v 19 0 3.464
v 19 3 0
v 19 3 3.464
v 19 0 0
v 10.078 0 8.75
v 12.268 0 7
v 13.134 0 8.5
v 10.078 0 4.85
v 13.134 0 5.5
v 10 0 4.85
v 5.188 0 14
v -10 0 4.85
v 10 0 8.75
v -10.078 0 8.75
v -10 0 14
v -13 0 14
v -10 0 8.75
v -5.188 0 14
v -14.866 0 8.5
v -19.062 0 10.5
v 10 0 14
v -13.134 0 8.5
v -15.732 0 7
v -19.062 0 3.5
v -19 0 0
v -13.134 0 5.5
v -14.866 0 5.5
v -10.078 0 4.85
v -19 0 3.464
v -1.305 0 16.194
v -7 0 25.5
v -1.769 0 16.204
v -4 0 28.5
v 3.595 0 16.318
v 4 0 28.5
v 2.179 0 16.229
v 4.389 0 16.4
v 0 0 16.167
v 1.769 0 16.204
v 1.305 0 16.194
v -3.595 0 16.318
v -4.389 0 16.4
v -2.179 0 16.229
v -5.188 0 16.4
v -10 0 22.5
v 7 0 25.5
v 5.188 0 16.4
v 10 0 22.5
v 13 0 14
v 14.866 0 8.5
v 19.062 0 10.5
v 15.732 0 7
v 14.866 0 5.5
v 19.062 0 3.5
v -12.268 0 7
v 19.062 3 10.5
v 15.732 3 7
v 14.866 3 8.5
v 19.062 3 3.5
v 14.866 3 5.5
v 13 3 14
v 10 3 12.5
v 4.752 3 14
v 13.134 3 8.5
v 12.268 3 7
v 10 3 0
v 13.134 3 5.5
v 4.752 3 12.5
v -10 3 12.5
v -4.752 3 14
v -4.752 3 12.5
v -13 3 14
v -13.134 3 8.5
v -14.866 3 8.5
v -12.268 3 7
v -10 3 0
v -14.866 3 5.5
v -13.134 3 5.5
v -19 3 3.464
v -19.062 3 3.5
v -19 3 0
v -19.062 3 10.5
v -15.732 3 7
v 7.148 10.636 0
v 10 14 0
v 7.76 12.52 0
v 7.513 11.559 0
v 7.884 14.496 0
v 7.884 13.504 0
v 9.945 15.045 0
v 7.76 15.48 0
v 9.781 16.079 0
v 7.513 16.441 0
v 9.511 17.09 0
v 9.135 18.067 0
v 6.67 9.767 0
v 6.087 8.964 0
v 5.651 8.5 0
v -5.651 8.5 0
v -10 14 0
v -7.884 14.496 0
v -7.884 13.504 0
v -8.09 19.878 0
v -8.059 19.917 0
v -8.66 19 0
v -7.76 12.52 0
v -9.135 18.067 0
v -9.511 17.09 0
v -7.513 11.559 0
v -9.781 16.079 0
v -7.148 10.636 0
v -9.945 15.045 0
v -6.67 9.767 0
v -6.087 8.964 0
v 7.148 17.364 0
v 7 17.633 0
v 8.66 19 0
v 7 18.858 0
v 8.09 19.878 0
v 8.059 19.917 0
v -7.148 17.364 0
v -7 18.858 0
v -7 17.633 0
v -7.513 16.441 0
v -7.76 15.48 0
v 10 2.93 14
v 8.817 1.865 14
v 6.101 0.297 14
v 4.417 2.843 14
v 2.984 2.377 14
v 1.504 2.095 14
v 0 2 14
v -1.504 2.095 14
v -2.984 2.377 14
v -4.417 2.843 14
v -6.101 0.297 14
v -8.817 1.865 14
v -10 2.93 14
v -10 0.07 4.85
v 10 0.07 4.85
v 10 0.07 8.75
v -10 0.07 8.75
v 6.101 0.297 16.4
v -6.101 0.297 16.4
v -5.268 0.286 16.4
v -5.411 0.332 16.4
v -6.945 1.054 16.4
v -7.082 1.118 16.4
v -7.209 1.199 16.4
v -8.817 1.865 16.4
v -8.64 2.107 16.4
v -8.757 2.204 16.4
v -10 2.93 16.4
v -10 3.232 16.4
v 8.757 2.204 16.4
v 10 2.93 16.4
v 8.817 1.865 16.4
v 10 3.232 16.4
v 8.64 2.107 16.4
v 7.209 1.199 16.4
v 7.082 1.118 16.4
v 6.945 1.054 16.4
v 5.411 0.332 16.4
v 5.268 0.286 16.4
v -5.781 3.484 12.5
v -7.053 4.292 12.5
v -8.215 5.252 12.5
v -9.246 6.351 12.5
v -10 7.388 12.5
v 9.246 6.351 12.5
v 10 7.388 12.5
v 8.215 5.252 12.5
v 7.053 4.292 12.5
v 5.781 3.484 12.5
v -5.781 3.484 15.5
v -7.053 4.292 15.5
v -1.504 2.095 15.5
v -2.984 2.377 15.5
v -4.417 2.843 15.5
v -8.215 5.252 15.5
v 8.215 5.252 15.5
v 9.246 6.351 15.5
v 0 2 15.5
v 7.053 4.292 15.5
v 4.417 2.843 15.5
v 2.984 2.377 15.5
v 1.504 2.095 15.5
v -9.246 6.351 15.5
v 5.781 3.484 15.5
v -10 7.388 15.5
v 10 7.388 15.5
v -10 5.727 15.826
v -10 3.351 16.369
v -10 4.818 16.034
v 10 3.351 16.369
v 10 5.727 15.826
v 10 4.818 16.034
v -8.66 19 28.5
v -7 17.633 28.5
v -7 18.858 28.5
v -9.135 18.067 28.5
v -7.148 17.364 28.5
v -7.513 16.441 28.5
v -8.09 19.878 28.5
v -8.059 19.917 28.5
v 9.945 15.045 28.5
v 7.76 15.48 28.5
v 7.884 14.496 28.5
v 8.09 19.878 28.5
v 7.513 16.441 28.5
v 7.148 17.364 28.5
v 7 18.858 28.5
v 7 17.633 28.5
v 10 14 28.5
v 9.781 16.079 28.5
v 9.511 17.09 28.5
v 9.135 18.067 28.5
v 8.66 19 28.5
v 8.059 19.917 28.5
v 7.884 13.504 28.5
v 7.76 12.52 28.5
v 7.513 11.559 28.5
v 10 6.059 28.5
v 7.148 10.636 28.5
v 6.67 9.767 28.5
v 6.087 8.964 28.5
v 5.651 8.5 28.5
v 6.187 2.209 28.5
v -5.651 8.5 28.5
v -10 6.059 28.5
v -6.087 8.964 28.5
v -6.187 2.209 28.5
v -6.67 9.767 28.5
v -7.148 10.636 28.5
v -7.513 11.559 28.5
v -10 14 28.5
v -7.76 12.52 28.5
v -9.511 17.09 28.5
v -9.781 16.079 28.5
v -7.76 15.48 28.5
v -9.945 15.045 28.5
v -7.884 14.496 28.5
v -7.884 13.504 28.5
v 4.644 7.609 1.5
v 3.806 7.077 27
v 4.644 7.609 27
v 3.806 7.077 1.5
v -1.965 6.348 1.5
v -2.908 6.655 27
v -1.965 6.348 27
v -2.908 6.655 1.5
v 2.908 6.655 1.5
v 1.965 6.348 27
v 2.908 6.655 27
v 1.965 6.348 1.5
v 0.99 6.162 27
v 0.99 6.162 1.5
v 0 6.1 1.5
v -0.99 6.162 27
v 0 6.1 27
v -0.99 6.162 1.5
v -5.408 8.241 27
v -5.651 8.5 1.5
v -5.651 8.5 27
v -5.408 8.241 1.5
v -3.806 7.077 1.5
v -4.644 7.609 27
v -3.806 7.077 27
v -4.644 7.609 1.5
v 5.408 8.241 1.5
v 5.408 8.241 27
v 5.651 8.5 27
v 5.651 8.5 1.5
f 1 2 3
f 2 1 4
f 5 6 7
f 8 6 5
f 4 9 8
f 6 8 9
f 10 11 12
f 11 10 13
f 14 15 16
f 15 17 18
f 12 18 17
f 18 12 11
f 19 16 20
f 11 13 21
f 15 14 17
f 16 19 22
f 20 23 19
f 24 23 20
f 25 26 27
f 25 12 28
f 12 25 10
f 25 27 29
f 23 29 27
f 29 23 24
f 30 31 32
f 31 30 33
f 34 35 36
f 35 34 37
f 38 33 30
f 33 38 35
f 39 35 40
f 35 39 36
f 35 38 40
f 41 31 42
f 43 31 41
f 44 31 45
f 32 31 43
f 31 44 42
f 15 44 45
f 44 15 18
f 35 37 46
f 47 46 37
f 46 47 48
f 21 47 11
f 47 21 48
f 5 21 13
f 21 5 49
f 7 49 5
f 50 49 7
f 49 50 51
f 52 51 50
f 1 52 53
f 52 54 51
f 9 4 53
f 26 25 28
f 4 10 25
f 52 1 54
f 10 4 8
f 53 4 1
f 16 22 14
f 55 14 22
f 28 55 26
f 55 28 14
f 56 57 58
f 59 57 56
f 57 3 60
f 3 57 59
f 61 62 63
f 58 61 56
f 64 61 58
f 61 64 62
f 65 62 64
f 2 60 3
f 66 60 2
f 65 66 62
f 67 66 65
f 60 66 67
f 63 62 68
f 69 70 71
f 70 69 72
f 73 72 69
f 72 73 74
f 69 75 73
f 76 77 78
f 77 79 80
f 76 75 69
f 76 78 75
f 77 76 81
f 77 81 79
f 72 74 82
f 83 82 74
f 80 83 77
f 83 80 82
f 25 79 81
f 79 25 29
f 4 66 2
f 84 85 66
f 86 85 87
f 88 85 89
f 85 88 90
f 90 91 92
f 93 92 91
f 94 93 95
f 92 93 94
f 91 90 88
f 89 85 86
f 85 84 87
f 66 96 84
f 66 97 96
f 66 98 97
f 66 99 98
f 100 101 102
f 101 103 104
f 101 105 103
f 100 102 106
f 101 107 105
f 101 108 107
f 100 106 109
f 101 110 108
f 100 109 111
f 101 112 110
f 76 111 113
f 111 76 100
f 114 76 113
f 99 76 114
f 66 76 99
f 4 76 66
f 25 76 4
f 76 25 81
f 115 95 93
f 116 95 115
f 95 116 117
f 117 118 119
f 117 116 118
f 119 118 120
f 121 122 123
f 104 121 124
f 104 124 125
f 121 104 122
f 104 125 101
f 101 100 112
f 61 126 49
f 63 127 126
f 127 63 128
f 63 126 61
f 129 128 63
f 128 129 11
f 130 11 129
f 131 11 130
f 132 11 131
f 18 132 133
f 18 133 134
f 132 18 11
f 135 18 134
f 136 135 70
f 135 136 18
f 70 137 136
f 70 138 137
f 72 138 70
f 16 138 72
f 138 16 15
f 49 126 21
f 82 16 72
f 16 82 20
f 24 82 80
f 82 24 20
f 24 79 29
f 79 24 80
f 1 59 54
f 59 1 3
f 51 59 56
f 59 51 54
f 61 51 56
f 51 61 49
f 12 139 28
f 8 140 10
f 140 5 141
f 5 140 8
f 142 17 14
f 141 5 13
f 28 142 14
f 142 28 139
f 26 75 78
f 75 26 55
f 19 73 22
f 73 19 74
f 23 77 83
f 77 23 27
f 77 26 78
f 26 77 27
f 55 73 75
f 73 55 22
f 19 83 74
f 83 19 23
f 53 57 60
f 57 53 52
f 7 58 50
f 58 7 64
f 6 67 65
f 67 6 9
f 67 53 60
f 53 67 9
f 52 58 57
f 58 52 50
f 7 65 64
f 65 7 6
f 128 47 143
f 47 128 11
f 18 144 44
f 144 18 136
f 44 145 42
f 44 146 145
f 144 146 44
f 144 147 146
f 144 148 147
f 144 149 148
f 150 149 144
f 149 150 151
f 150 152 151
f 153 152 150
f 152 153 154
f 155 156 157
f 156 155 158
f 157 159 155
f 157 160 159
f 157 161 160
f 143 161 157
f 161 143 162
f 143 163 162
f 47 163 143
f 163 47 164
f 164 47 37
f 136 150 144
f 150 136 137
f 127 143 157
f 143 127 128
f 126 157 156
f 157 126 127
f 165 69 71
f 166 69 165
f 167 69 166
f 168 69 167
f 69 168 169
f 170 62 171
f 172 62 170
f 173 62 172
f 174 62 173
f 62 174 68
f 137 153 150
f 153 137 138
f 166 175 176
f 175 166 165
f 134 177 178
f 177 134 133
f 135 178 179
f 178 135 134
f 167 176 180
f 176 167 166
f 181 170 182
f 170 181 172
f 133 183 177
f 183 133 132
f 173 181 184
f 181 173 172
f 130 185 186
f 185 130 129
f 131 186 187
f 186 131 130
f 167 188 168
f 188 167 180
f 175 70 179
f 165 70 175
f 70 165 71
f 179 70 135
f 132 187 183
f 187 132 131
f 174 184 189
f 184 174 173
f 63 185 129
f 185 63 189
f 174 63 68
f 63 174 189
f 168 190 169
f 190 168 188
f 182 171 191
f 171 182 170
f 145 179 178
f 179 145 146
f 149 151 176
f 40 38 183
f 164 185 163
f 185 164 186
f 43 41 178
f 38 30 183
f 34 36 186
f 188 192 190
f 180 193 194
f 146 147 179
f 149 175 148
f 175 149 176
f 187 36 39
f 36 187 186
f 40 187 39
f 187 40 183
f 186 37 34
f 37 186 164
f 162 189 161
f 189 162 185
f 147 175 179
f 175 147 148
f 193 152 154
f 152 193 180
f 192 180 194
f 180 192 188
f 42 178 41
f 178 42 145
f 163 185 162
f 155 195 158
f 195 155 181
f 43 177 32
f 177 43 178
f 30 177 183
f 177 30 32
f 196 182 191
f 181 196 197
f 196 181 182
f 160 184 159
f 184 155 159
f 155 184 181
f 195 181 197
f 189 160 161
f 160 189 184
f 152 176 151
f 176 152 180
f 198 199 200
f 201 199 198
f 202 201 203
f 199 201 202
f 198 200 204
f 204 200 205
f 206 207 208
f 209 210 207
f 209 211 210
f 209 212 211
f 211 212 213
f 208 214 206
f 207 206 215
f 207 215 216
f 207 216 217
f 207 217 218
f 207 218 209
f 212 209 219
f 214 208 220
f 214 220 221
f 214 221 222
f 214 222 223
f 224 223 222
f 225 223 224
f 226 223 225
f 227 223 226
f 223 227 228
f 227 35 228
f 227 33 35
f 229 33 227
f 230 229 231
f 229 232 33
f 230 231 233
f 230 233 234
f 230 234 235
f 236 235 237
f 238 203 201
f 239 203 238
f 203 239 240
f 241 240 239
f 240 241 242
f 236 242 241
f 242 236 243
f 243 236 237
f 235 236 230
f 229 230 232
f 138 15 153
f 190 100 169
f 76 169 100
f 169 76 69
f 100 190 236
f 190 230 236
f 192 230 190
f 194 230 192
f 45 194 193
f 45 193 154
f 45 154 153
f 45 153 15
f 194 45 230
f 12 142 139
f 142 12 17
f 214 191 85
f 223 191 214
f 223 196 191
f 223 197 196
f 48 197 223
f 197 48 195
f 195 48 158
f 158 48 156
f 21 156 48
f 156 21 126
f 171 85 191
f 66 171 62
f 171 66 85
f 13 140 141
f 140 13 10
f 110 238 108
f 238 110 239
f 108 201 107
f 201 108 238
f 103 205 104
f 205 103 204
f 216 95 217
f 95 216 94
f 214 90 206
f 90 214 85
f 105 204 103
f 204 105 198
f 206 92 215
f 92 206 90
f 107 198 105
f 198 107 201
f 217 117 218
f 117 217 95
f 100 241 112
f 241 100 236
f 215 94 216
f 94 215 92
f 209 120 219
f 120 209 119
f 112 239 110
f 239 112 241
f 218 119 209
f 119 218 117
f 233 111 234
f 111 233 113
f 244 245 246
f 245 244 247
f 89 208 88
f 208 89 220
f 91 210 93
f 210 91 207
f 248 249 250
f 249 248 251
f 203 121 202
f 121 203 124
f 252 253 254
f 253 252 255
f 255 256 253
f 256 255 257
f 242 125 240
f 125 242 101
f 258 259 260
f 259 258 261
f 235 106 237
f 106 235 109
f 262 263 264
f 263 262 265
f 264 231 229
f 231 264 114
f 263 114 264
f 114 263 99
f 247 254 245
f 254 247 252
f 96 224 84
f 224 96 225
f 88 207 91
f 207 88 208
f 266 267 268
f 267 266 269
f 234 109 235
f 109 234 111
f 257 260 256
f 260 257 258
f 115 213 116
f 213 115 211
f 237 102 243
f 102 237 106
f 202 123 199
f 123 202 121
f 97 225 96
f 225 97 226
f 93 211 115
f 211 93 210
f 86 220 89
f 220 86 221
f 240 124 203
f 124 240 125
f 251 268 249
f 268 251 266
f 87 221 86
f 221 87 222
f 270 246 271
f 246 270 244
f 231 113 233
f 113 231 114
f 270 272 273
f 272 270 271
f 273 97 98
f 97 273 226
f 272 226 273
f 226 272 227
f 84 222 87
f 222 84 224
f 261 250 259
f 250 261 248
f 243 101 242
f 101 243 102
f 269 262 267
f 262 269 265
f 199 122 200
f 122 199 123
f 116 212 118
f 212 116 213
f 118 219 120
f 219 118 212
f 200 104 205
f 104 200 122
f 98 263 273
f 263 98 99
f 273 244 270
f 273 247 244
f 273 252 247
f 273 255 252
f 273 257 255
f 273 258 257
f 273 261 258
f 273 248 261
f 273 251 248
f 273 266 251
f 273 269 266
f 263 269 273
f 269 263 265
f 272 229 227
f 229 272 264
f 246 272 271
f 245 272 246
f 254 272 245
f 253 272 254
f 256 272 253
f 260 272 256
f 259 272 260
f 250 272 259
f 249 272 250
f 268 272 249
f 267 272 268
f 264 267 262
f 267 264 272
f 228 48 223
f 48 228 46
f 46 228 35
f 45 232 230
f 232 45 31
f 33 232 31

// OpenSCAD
// file: functions.scad
// PRUSA Mendel  
// Functions used in many files
// GNU GPL v3
// Josef Průša
// josefprusa@me.com
// prusadjs.cz
// http://www.reprap.org/wiki/Prusa_Mendel
// http://github.com/prusajr/PrusaMendel


module nut(d,h,horizontal=true) {
	cornerdiameter = (d / 2) / cos (180 / 6);
	cylinder(h = h, r = cornerdiameter, $fn = 6);
	if(horizontal) {
		for(i = [1:6]) {
			rotate([0,0,60*i]) translate([-cornerdiameter-0.2,0,0]) rotate([0,0,-45]) cube(size = [2,2,h]);
		}
	}
}

// Based on nophead research
module polyhole(d,h) {
	n = max(round(2 * d),3);
	rotate([0,0,180])
		cylinder(h = h, r = (d / 2) / cos (180 / n), $fn = n);
}

module roundcorner(diameter) {
	difference() {
		cube(size = [diameter,diameter,99], center = false);
		translate(v = [diameter, diameter, 0]) cylinder(h = 100, r=diameter, center=true);
	}
}
// file: metric.scad
// PRUSA Mendel  
// Default metric sizes
// GNU GPL v2
// Josef Průša
// josefprusa@me.com
// prusadjs.cz
// http://www.reprap.org/wiki/Prusa_Mendel
// http://github.com/prusajr/PrusaMendel

// DONT CHANGE THIS FILE! ALTER VALUES IN CONFIGURATION.SCAD INSTEAD

// RODS

threaded_rod_diameter = 8.2;
threaded_rod_diameter_horizontal = 8.2;
smooth_bar_diameter = 8;
smooth_bar_diameter_horizontal = 8.5;

// Nuts and bolts
// Nut diameters are flat to flat

m8_diameter = 9;
m8_nut_diameter = 16.4;
m8_nut_thickness = 6.5;

m4_diameter = 4.5;
m4_nut_diameter = 9;
m4_nut_thickness = 3.2;

m3_diameter = 3.6;
m3_nut_diameter = 6.1;
m3_nut_thickness = 2.4;

// Bushing holder

bushing_core_diameter = smooth_bar_diameter;
bushing_material_thickness = 1;

// Motors

motor_shaft = 5.5;
// file: bushing.scad
// PRUSA Mendel  
// Bushings
// GNU GPL v3
// Josef Průša
// josefprusa@me.com
// prusadjs.cz
// http://www.reprap.org/wiki/Prusa_Mendel
// http://github.com/prusajr/PrusaMendel

include <configuration.scad>

/**
 * @id bushing
 * @name Bushing
 * @category Printed
 * @id bushing
 */ 

module bushing(stiff, lenght=11) {
	difference() {
		union() {
			translate(v=[-7.5,-8,0])cube(size = [15,8,lenght]);
			cylinder(h = lenght, r=7.5);
		}
		//cutout inside
		//Opening
		rotate(a=[0,0,45]) translate(v=[1,1,-1]) cube(size = [16,16,lenght+2]);
		//Cutouts to make it more bendy
		if(stiff) {
			translate(v=[-4.8,-6,-1]) cube(size = [0.8,6,lenght+2]);
			translate(v=[4,-6,-1]) cube(size = [0.8,6,lenght+2]);
		} else {
			translate(v=[-4.8,-8,-1]) cube(size = [0.8,8,lenght+2]);
			translate(v=[4,-8,-1]) cube(size = [0.8,8,lenght+2]);
		}
		translate(v=[0,5,(lenght+2)/2]) cube(size = [7,8,lenght+2], center=true);
		translate(v=[0,0,-1]) cylinder(h = lenght+2, r=5);
	}
}


module standart_bushing() {
	difference() {
		translate(v=[0,5,8])rotate(a=[90,0,0]) {
			bushing(false, 10);
			translate(v=[-7,-13,0])cube(size = [14,5,10]);
			translate(v=[-2,-13,-3])cube(size = [4,5,16]);
			translate(v=[-2,-12,-3])cube(size = [4,7.5,2]);
			translate(v=[-2,-12,11])cube(size = [4,7.5,2]);
		}
		
		translate(v=[-3,-1,-16])rotate(a=[45,0,0])cube(size = [6,5,16]);
		mirror([ 0, 1, 0 ]) translate(v=[-3,-1,-16])rotate(a=[45,0,0])cube(size = [6,5,16]);
	}
}


// Includes small cutouts for better prints
module vertical_bushing(stiff, lenght) {
	difference() {
		bushing(stiff, lenght);
		translate(v=[-5,0,-1]) cube(size = [10,2.5,lenght+2]);
	}
}


//vertical_bushing(true, 11);

module z_bushings() {
	// STUFF FOR X-ENDS
	difference() {
		// Slider.
		translate([0,6.5,30]) 
			cube([23,17,60],center=true);
		// Slider cutout.
		translate([0,10,32.5]) 
			cube([17,17,70],center=true);
	}
	union() {
		translate([0,9.5,0])vertical_bushing(true,13);
		//translate([0,4,0.5])cube(size = [8,2,1], center = true);
		//translate([0,4,12.5])cube(size = [8,2,1], center = true);
		translate([0,9.5,48])vertical_bushing(true,13);
		//translate([0,4,48+0.5])cube(size = [8,2,1], center = true);
		//translate([0,4,48+12.5])cube(size = [8,2,1], center = true);
		
		translate([0,9.5,32]) {
			difference() {
				bushing(true,16);
				translate([0,3,2]) 
				rotate([45,0,0])
				cube([16,30,16], center=true);
			}
		}
	}
}


// Linear bushing options


lm8uu_diameter=(lme8uu==true) ? 16 : 15;
lm8uu_length=(lme8uu==true) ? 25 : 24;
lm8uu_radius = lm8uu_diameter / 2;
block_height = 2*lm8uu_length+17;

module cut_corners(lf,lb,rf,rb) {
	difference() {
		lm8uu_bearing_holder(limits=true);
		if(lf) translate(v=[(10)-3,(-28.5/2)+3,0]) rotate(a=[0,0,45]) 
			rotate(a=[35,0,0]) translate(v=[0,-5,0]) cube(size = [20,10,20], center = true);
		if(lb) translate(v=[(-10)+3,(-28.5/2)+3,0]) rotate(a=[0,0,-45]) 
			rotate(a=[35,0,0]) translate(v=[0,-5,0]) cube(size = [20,10,20], center = true);
		mirror([ 0, 1, 0 ]) {
			if(rf) translate(v=[(10)-3,(-28.5/2)+3,0]) rotate(a=[0,0,45]) 
				rotate(a=[35,0,0]) translate(v=[0,-5,0]) cube(size = [20,10,20], center = true);
			if(rb) translate(v=[(-10)+3,(-28.5/2)+3,0]) rotate(a=[0,0,-45]) 
				rotate(a=[35,0,0]) translate(v=[0,-5,0]) cube(size = [20,10,20], center = true);
		}
	}
}

linear_holder_base(65);
module linear_holder_base(length, width=10) {
	
	difference() {
		union() {
			//main block
			translate(v=[-5,0,length/2]) cube(size = [width,20,length], center = true);

			//holder for main block in x-end
			// leaving it out now
			translate(v=[0,0,0]) cylinder(h = length, r=10, $fn=60);
		}
		//main axis
		translate(v=[0,0,-2]) cylinder(h = length+4, r=(lm8uu_diameter+0.8)/2, $fn=50);
		%translate(v=[0,0,-2]) cylinder(h = length+4, r=8/2, $fn=50);
		// not needed for zip tie
		//main cut
		translate(v=[10,0,length/2]) cube(size = [20,14,length+4], center = true);
		//smooth entry cut
		translate(v=[12,0,length/2]) rotate(a=[0,0,45]) cube(size = [20,20,length+4], center = true);
	}
}


module y_linear_bearings() {
	translate([0,3,7]) rotate([90,0,0]) difference() {
		#union() {
			translate(v=[0,-4,1.5]) cube(size = [26+12,6,3], center = true);
			translate(v=[0,0,1.5]) cube(size = [26,14,3], center = true);
			translate(v=[-13,0,0])rotate(a=[0,0,30])cylinder(h = 3, r=7, $fn=6);
			translate(v=[13,0,0])rotate(a=[0,0,30])cylinder(h = 3, r=7, $fn=6); 
		}

		translate(v=[-14,0,0]) polyhole(m3_diameter, 10);
		translate(v=[14,0,0]) polyhole(m3_diameter, 10);
		//hack
		translate(v=[0,14.25,4.5]) rotate(a=[90,0,0]) translate(v=[0,9.5,0]) rotate(a=[0,0,90]) {
			translate(v=[0,0,lm8uu_length/2+0.5]) ziptie();
		}
	}

	translate([0,0,14.25]) rotate([-90,0,0]) cut_corners(true, true, false, false);
}

lm8uu_holder_length = lm8uu_length+4.5;
lm8uu_holder_width= lm8uu_diameter+5;

module lm8uu_bearing_holder(limits=true) {
	translate(v=[0,14.25,4.5]) rotate(a=[90,0,0]) translate(v=[0,9.5,0]) rotate(a=[0,0,90]) {

		difference() {
			union() {
				linear_holder_base(lm8uu_length+4.5);
				translate(v=[-10-2,0,lm8uu_holder_length/2]) 
					cube(size = [4,20,lm8uu_holder_length], center = true);
			}
			translate(v=[0,0,12.5]) ziptie();
		}

		if(limits) {
			#translate(v=[-(10-5.5)/2-5.5,0,0.75]) cube(size = [10-5.5,20,1.5], center = true);
			translate(v=[-(10-5.5)/2-5.5,0,lm8uu_length+3.75]) cube(size = [10-5.5,20,1.5], center = true);
		}
	}
}

module lm8uu_bearing_cut() {
	translate([-lm8uu_holder_width/2,-lm8uu_holder_length/2,-5])
		cube([lm8uu_holder_width,lm8uu_holder_length,20]);
}

//z_linear_bearings();
module z_linear_bearings() {

	translate(v=[0,9.5,0]) rotate(a=[0,0,90]) {
		difference() {
			linear_holder_base(65-9);
			translate(v=[0,0,14.5+2]) ziptie();
			translate(v=[0,0,block_height-(12+2)-5-5]) ziptie();
		}

		//x-end adapter
		difference() {
			translate(v=[-6,0,15.8/2]) cube(size = [10,23,15.8], center = true);
			translate(v=[0,0,-2]) cylinder(h = 20, r=7.9, $fn=50);
		}
		translate(v=[-(10-5.5)/2-lm8uu_radius+2,0,0+1]) cube(size = [10-5.5,20,2], center = true);
		translate(v=[-(10-5.5)/2-lm8uu_radius+2,0,lm8uu_length+4.0]) cube(size = [10-5.5,20,2], center = true);
		*translate(v=[-(10-5.5)/2-lm8uu_radius+2,0,64-lm8uu_length-3-9]) cube(size = [10-5.5,20,2], center = true);
		translate(v=[-(10-5.5)/2-lm8uu_radius+2,0,64-9]) cube(size = [10-5.5,20,2], center = true);
	}
}

module ziptie(){
	difference() {
		translate(v=[0,0,0]) cylinder(h = 3.9, r=lm8uu_diameter);
		translate(v=[0,0,0]) cylinder(h = 5, r=lm8uu_diameter-3, $fn=50);
		translate(v=[0,0,3]) cylinder(h = 1, r1=lm8uu_diameter-3, r2=lm8uu_diameter, $fn=50);
	}
}
// file: configuration.scad
// PRUSA Mendel  
// Configuration file
// GNU GPL v3
// Josef Průša
// josefprusa@me.com
// prusadjs.cz
// http://www.reprap.org/wiki/Prusa_Mendel
// http://github.com/prusajr/PrusaMendel

// PLEASE SELECT ONE OF THE CONFIGURATIONS BELOW
// BY UN-COMMENTING IT

// Uncomment for metric settings
// METRIC METRIC METRIC METRIC METRIC METRIC METRIC METRIC 

include <metric.scad>;

// CUSTOM CUSTOM CUSTOM CUSTOM CUSTOM CUSTOM CUSTOM CUSTOM CUSTOM

thin_wall = 3;


// Linear bearing version
linear = true;
// set false for LM-8UU, true for LM-E-8UU (ignore if linear is set to false)
lme8uu = false;



// CHANGE ONLY THE STUFF YOU KNOW
// IT WILL REPLACE DEFAULT SETTING

// RODS

// threaded_rod_diameter = 0;
// threaded_rod_diameter_horizontal = 0;
// smooth_bar_diameter = 0;
// smooth_bar_diameter_horizontal = 0;

// Nuts and bolts

// m8_diameter = 0;
// m8_nut_diameter = 0;

// m4_diameter = 0;
// m4_nut_diameter = 0;

m3_diameter = 3; // polyholes need the exact measurement
// m3_nut_diameter = 0;

// Bushing holder

// bushing_core_diameter = smooth_bar_diameter;
// bushing_material_thickness = 0;


///counted stuff
m3_nut_diameter_bigger = ((m3_nut_diameter  / 2) / cos (180 / 6))*2;

// functions 
include <functions.scad>
// main file
// PRUSA Mendel  
// Y bushing holder
// Used for sliding on X axis
// GNU GPL v3
// Josef Průša
// josefprusa@me.com
// prusadjs.cz
// http://www.reprap.org/wiki/Prusa_Mendel
// http://github.com/prusajr/PrusaMendel

include <configuration.scad>

/**
 * @id y-bushing
 * @name Y bushing
 * @category Printed
 * @using 4 m3washer
 * @using 2 m3x15xhex
 * @using 2 m3nut
 */

snap_in_mount = false;
use <bushing.scad>

module ybushing(linear_bearing=true) {
	if(linear_bearing==false) {
		translate(v = [0,0,-2.05]) difference() {
			union() {
				translate(v = [0,0,5.05/2]) cube(size = [33,10,5.05], center = true);
				translate(v = [0,0,5]) rotate(a=[0,0,0]) standart_bushing();
			}
			translate(v = [12, 0, -2]) polyhole(m3_diameter, 12);
			translate(v = [-12, 0, -2]) polyhole(m3_diameter, 12);

			translate(v = [0,0,2.0/2]) cube(size = [34,120,2.05], center = true);
		}
	} else {
	// Greg Frosts

		y_linear_bearings();
	}
}

ybushing(linear);
